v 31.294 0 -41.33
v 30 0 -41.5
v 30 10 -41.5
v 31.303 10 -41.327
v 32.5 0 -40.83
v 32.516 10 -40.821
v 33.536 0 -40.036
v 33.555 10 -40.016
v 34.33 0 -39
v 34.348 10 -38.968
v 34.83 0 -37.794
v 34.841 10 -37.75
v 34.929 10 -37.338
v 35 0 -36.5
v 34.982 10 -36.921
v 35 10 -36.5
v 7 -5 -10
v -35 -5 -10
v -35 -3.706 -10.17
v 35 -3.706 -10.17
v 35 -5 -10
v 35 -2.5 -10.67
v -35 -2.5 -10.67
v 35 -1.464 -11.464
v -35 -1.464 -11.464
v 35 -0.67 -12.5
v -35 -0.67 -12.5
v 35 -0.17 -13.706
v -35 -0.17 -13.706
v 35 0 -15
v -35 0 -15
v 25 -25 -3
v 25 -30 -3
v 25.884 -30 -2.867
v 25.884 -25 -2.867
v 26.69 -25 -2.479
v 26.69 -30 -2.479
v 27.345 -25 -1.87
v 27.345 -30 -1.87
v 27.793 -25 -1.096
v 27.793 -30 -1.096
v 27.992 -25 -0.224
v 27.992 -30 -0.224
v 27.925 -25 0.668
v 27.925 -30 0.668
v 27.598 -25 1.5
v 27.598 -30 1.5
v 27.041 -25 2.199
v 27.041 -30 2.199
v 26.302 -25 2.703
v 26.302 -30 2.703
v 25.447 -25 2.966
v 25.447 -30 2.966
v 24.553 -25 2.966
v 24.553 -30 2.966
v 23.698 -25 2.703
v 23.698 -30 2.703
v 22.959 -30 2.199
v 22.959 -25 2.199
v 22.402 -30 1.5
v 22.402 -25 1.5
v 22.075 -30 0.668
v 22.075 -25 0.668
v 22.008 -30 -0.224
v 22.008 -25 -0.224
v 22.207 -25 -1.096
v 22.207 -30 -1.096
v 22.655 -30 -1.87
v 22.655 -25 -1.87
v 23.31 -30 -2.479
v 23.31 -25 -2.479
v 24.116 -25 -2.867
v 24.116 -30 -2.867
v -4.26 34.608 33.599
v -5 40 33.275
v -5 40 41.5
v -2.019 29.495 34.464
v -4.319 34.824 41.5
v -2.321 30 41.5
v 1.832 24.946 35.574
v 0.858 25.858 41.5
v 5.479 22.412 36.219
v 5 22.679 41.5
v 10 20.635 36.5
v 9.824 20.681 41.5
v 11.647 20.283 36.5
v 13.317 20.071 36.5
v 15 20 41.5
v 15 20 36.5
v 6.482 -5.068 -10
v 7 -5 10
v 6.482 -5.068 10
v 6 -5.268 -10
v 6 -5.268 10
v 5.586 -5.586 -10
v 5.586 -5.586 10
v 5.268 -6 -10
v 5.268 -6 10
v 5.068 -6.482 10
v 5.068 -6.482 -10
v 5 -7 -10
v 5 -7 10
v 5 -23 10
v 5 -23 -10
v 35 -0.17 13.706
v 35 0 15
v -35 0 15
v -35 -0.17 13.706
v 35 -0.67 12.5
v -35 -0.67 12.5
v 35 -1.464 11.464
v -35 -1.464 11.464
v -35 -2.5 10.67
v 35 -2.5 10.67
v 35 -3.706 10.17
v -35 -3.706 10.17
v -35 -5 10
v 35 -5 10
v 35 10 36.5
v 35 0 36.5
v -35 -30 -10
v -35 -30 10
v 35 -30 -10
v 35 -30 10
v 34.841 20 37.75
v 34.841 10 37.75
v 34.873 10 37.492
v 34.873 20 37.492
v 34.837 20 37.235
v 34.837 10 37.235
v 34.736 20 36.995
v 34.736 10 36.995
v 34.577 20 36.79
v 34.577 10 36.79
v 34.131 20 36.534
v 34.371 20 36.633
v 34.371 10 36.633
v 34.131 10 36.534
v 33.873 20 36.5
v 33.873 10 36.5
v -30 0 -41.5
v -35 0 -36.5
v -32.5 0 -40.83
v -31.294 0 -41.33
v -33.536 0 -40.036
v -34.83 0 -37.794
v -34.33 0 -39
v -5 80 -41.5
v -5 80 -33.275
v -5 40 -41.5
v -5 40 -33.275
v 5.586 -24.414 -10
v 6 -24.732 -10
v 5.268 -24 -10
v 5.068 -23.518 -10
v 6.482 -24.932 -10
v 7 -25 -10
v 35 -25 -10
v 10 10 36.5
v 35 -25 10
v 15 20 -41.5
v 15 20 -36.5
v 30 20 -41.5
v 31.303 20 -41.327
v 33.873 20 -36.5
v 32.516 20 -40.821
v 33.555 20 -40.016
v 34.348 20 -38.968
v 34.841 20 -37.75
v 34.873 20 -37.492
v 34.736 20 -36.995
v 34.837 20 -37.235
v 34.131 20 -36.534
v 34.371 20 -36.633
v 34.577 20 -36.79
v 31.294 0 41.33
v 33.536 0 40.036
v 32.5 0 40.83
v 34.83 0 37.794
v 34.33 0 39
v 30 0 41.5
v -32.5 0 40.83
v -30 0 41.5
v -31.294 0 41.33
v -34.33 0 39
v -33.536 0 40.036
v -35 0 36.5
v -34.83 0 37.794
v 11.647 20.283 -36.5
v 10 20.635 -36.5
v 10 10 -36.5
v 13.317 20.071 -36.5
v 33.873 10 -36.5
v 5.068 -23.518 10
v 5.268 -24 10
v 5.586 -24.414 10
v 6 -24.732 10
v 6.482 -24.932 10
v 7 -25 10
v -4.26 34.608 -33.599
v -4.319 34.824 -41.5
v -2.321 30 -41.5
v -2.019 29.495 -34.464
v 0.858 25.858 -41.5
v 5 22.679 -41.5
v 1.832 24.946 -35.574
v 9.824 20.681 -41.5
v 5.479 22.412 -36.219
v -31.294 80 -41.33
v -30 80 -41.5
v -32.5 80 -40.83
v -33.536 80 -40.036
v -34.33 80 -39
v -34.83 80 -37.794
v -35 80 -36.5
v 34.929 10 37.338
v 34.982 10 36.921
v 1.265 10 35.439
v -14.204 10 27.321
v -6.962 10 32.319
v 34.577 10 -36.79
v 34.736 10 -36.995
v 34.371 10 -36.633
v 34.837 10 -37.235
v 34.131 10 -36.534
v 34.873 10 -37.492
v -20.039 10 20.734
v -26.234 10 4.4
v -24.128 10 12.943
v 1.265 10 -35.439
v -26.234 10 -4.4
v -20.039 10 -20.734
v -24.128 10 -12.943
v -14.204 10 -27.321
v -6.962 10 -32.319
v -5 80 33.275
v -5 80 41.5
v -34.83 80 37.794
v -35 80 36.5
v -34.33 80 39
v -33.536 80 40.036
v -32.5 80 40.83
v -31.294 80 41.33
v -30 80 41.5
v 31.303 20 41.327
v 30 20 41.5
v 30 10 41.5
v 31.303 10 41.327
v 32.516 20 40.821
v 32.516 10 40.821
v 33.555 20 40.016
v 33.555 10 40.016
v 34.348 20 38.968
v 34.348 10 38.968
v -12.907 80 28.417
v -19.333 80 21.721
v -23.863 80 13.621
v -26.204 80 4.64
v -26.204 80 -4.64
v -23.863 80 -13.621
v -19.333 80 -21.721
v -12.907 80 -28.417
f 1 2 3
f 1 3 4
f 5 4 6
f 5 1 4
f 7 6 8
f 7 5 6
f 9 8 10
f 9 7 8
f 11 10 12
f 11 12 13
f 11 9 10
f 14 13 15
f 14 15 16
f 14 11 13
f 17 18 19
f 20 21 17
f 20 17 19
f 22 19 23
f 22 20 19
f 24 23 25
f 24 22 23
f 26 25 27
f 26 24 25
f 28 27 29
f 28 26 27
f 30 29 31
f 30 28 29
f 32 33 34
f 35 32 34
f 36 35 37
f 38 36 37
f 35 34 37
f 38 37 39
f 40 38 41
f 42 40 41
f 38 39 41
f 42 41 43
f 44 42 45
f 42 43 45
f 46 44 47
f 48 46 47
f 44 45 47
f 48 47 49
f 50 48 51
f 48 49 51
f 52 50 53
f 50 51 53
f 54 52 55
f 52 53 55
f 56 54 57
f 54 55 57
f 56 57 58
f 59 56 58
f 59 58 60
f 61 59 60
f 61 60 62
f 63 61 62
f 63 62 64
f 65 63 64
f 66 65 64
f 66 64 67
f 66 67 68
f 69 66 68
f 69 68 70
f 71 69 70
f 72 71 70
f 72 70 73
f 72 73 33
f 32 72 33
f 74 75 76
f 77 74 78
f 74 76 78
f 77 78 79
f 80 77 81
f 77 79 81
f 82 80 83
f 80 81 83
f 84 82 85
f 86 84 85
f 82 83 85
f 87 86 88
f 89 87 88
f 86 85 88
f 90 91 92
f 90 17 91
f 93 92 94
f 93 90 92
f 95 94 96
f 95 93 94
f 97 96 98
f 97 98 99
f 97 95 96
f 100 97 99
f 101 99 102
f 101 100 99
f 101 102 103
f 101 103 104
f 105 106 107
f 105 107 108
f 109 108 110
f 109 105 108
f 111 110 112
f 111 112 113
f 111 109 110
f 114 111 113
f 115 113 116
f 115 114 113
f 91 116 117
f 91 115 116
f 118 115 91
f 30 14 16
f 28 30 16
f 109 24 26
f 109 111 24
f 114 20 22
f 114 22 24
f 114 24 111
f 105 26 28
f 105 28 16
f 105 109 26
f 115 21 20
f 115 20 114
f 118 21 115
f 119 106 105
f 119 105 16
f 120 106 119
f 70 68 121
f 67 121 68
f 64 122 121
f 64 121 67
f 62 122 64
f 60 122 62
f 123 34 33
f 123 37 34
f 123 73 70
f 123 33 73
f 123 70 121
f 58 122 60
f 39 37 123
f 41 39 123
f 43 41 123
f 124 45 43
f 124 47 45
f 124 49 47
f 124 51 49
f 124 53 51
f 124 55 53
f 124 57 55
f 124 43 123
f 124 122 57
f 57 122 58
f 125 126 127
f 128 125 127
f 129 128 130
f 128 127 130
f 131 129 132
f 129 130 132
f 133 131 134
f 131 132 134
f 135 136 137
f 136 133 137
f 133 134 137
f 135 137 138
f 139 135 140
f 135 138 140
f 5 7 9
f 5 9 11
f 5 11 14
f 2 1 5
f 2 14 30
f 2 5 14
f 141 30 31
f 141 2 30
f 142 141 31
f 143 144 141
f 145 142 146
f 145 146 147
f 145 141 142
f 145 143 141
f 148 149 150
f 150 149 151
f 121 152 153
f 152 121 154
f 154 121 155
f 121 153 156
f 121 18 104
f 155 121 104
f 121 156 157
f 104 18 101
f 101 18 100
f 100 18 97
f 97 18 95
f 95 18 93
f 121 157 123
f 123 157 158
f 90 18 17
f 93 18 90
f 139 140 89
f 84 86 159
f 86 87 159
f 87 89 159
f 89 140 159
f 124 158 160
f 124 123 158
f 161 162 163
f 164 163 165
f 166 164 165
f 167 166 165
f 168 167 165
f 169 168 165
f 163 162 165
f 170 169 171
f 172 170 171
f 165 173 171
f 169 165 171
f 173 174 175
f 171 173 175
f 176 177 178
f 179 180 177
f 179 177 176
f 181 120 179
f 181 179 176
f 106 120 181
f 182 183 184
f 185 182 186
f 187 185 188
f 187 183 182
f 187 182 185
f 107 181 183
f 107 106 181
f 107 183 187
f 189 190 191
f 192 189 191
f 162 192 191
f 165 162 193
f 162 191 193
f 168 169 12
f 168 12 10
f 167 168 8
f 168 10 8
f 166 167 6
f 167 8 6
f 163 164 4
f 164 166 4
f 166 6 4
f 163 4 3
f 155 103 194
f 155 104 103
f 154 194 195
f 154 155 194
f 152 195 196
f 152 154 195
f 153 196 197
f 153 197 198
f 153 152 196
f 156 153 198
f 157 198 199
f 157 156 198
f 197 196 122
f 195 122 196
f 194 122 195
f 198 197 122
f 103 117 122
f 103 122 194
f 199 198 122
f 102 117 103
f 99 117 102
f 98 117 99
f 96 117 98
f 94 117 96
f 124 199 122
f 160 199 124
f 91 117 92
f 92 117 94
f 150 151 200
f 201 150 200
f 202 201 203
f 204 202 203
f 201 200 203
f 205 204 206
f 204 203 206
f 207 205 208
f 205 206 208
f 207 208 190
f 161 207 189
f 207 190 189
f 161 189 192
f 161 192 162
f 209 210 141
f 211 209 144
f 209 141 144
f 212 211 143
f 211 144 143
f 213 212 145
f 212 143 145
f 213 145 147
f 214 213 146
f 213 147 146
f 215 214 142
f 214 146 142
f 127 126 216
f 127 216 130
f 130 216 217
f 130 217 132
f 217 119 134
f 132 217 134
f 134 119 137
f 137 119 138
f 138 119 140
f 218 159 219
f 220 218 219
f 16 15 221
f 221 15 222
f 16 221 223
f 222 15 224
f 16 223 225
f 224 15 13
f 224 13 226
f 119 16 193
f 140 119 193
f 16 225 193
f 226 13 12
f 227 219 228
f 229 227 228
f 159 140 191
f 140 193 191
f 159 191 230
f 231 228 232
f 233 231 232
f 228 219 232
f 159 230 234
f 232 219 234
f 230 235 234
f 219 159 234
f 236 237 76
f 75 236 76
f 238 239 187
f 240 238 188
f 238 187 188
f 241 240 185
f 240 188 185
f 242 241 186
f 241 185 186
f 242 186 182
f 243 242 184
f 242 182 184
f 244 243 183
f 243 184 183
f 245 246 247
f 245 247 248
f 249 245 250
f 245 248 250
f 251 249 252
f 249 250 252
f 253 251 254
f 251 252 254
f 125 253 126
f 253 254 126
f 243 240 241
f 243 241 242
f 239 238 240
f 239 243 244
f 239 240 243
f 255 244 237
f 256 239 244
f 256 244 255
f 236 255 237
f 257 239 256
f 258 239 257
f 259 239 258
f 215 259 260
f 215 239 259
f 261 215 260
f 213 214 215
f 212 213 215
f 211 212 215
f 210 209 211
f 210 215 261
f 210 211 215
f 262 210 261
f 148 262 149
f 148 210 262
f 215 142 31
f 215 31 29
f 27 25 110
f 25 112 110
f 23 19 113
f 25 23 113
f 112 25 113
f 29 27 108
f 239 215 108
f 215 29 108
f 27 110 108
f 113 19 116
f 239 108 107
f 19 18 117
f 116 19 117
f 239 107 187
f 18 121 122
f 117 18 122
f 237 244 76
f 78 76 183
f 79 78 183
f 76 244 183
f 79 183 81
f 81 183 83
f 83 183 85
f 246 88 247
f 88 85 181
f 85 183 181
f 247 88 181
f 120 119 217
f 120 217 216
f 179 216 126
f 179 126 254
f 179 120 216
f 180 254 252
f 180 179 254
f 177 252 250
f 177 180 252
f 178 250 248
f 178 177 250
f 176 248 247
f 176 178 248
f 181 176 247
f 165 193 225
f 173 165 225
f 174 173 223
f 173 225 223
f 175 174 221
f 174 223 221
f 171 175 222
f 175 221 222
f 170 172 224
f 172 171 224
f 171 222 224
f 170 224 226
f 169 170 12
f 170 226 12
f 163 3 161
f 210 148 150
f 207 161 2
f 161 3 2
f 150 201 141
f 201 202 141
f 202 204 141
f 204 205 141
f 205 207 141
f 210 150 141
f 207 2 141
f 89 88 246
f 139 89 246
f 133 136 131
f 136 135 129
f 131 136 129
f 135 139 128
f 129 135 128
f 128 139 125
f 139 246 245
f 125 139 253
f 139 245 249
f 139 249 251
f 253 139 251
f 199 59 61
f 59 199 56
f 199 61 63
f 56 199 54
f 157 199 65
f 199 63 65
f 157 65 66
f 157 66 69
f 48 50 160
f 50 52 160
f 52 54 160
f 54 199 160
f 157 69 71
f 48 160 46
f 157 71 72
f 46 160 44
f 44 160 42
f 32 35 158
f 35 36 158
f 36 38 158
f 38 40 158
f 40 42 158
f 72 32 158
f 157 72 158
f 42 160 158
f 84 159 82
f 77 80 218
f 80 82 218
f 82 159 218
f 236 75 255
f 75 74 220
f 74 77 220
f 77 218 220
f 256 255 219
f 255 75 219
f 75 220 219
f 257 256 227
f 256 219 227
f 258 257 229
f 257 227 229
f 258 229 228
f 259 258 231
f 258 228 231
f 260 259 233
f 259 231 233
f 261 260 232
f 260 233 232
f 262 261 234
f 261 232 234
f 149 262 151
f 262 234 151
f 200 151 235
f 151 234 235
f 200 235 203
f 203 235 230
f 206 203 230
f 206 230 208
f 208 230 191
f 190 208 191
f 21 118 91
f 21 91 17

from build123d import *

# Parameters (mm, degrees)
EXTRUDE_1_DEPTH     = 10
EXTRUDE_2_DEPTH     = 70
SKETCH_6_W          = 70
SKETCH_6_H          = 20
EXTRUDE_3_DEPTH     = 30
SKETCH_8_R          = 3
CUT_EXTRUDE_5_DEPTH = 15
FILLET_2_R          = 5
SKETCH_9_W          = 20
SKETCH_9_H          = 20
CUT_EXTRUDE_6_DEPTH = 30
FILLET_4_R          = 2
CUT_EXTRUDE_7_DEPTH = 121.474063599


with BuildPart() as part:
    # 草圖2 → 填料-伸長1 (new body)
    with BuildSketch(Plane(origin=(0, 0, 0), x_dir=(1, 0, 0), z_dir=(0, 1, 0))):
        with BuildLine():
            Line((-30, 41.5), (30, 41.5))
            ThreePointArc((30, 41.5), (33.535533906, 40.035533906), (35, 36.5))
            Line((35, 36.5), (35, -36.5))
            ThreePointArc((35, -36.5), (33.535533906, -40.035533906), (30, -41.5))
            Line((30, -41.5), (-30, -41.5))
            ThreePointArc((-30, -41.5), (-33.535533906, -40.035533906), (-35, -36.5))
            Line((-35, -36.5), (-35, 36.5))
            ThreePointArc((-35, 36.5), (-33.535533906, 40.035533906), (-30, 41.5))
        make_face()
    extrude(amount=EXTRUDE_1_DEPTH)

    # 草圖3 → 填料-伸長2 (add)
    with BuildSketch(Plane(origin=(0, 10, 0), x_dir=(1, 0, 0), z_dir=(0, 1, 0))):
        with BuildLine():
            Line((-35, 36.5), (-35, -36.5))
            ThreePointArc((-35, -36.5), (-33.535533906, -40.035533906), (-30, -41.5))
            Line((-30, -41.5), (30, -41.5))
            ThreePointArc((30, -41.5), (33.061862178, -40.452847075), (34.841229183, -37.75))
            ThreePointArc((34.841229183, -37.75), (34.663552761, -36.887627564), (33.872983346, -36.5))
            Line((33.872983346, -36.5), (10, -36.5))
            ThreePointArc((10, -36.5), (-26.5, 0), (10, 36.5))
            Line((10, 36.5), (33.872983346, 36.5))
            ThreePointArc((33.872983346, 36.5), (34.663552761, 36.887627564), (34.841229183, 37.75))
            ThreePointArc((34.841229183, 37.75), (33.061862178, 40.452847075), (30, 41.5))
            Line((30, 41.5), (-30, 41.5))
            ThreePointArc((-30, 41.5), (-33.535533906, 40.035533906), (-35, 36.5))
        make_face()
    extrude(amount=EXTRUDE_2_DEPTH)

    # 草圖6 → 填料-伸長3 (add)
    with BuildSketch(Plane.XZ):
        Rectangle(SKETCH_6_W, SKETCH_6_H)
    extrude(amount=EXTRUDE_3_DEPTH)

    # 草圖8 → 除料-伸長5 (cut)
    with BuildSketch(Plane.XZ.offset(30)):
        with Locations(Location((25, 0, 0), (0, 0, 270))):
            Circle(SKETCH_8_R)
    extrude(amount=-CUT_EXTRUDE_5_DEPTH, mode=Mode.SUBTRACT)

    # 圓角2
    fillet_2_edges = [part.edges().sort_by_distance(p)[0] for p in [
        (0, 0, -10),
        (0, 0, 10),
    ]]
    fillet(fillet_2_edges, radius=FILLET_2_R)

    # 草圖9 → 除料-伸長6 (cut)
    with BuildSketch(Plane(origin=(35, 0, 0), x_dir=(0, 0, -1), z_dir=(1, 0, 0))):
        with Locations((0, -15)):
            Rectangle(SKETCH_9_W, SKETCH_9_H)
    extrude(amount=-CUT_EXTRUDE_6_DEPTH, mode=Mode.SUBTRACT)

    # 圓角4
    fillet_4_edges = [part.edges().sort_by_distance(p)[0] for p in [
        (5, -25, 0),
        (5, -5, 0),
    ]]
    fillet(fillet_4_edges, radius=FILLET_4_R)

    # 草圖10 → 除料-伸長7 (cut, through all)
    with BuildSketch(Plane.XY.offset(41.5)):
        with BuildLine():
            Line((35, 80), (-5, 80))
            Line((-5, 80), (-5, 40))
            ThreePointArc((-5, 40), (0.857864376, 25.857864376), (15, 20))
            Line((15, 20), (35, 20))
            Line((35, 20), (35, 80))
        make_face()
    extrude(amount=-CUT_EXTRUDE_7_DEPTH, mode=Mode.SUBTRACT)


solid = part.part
